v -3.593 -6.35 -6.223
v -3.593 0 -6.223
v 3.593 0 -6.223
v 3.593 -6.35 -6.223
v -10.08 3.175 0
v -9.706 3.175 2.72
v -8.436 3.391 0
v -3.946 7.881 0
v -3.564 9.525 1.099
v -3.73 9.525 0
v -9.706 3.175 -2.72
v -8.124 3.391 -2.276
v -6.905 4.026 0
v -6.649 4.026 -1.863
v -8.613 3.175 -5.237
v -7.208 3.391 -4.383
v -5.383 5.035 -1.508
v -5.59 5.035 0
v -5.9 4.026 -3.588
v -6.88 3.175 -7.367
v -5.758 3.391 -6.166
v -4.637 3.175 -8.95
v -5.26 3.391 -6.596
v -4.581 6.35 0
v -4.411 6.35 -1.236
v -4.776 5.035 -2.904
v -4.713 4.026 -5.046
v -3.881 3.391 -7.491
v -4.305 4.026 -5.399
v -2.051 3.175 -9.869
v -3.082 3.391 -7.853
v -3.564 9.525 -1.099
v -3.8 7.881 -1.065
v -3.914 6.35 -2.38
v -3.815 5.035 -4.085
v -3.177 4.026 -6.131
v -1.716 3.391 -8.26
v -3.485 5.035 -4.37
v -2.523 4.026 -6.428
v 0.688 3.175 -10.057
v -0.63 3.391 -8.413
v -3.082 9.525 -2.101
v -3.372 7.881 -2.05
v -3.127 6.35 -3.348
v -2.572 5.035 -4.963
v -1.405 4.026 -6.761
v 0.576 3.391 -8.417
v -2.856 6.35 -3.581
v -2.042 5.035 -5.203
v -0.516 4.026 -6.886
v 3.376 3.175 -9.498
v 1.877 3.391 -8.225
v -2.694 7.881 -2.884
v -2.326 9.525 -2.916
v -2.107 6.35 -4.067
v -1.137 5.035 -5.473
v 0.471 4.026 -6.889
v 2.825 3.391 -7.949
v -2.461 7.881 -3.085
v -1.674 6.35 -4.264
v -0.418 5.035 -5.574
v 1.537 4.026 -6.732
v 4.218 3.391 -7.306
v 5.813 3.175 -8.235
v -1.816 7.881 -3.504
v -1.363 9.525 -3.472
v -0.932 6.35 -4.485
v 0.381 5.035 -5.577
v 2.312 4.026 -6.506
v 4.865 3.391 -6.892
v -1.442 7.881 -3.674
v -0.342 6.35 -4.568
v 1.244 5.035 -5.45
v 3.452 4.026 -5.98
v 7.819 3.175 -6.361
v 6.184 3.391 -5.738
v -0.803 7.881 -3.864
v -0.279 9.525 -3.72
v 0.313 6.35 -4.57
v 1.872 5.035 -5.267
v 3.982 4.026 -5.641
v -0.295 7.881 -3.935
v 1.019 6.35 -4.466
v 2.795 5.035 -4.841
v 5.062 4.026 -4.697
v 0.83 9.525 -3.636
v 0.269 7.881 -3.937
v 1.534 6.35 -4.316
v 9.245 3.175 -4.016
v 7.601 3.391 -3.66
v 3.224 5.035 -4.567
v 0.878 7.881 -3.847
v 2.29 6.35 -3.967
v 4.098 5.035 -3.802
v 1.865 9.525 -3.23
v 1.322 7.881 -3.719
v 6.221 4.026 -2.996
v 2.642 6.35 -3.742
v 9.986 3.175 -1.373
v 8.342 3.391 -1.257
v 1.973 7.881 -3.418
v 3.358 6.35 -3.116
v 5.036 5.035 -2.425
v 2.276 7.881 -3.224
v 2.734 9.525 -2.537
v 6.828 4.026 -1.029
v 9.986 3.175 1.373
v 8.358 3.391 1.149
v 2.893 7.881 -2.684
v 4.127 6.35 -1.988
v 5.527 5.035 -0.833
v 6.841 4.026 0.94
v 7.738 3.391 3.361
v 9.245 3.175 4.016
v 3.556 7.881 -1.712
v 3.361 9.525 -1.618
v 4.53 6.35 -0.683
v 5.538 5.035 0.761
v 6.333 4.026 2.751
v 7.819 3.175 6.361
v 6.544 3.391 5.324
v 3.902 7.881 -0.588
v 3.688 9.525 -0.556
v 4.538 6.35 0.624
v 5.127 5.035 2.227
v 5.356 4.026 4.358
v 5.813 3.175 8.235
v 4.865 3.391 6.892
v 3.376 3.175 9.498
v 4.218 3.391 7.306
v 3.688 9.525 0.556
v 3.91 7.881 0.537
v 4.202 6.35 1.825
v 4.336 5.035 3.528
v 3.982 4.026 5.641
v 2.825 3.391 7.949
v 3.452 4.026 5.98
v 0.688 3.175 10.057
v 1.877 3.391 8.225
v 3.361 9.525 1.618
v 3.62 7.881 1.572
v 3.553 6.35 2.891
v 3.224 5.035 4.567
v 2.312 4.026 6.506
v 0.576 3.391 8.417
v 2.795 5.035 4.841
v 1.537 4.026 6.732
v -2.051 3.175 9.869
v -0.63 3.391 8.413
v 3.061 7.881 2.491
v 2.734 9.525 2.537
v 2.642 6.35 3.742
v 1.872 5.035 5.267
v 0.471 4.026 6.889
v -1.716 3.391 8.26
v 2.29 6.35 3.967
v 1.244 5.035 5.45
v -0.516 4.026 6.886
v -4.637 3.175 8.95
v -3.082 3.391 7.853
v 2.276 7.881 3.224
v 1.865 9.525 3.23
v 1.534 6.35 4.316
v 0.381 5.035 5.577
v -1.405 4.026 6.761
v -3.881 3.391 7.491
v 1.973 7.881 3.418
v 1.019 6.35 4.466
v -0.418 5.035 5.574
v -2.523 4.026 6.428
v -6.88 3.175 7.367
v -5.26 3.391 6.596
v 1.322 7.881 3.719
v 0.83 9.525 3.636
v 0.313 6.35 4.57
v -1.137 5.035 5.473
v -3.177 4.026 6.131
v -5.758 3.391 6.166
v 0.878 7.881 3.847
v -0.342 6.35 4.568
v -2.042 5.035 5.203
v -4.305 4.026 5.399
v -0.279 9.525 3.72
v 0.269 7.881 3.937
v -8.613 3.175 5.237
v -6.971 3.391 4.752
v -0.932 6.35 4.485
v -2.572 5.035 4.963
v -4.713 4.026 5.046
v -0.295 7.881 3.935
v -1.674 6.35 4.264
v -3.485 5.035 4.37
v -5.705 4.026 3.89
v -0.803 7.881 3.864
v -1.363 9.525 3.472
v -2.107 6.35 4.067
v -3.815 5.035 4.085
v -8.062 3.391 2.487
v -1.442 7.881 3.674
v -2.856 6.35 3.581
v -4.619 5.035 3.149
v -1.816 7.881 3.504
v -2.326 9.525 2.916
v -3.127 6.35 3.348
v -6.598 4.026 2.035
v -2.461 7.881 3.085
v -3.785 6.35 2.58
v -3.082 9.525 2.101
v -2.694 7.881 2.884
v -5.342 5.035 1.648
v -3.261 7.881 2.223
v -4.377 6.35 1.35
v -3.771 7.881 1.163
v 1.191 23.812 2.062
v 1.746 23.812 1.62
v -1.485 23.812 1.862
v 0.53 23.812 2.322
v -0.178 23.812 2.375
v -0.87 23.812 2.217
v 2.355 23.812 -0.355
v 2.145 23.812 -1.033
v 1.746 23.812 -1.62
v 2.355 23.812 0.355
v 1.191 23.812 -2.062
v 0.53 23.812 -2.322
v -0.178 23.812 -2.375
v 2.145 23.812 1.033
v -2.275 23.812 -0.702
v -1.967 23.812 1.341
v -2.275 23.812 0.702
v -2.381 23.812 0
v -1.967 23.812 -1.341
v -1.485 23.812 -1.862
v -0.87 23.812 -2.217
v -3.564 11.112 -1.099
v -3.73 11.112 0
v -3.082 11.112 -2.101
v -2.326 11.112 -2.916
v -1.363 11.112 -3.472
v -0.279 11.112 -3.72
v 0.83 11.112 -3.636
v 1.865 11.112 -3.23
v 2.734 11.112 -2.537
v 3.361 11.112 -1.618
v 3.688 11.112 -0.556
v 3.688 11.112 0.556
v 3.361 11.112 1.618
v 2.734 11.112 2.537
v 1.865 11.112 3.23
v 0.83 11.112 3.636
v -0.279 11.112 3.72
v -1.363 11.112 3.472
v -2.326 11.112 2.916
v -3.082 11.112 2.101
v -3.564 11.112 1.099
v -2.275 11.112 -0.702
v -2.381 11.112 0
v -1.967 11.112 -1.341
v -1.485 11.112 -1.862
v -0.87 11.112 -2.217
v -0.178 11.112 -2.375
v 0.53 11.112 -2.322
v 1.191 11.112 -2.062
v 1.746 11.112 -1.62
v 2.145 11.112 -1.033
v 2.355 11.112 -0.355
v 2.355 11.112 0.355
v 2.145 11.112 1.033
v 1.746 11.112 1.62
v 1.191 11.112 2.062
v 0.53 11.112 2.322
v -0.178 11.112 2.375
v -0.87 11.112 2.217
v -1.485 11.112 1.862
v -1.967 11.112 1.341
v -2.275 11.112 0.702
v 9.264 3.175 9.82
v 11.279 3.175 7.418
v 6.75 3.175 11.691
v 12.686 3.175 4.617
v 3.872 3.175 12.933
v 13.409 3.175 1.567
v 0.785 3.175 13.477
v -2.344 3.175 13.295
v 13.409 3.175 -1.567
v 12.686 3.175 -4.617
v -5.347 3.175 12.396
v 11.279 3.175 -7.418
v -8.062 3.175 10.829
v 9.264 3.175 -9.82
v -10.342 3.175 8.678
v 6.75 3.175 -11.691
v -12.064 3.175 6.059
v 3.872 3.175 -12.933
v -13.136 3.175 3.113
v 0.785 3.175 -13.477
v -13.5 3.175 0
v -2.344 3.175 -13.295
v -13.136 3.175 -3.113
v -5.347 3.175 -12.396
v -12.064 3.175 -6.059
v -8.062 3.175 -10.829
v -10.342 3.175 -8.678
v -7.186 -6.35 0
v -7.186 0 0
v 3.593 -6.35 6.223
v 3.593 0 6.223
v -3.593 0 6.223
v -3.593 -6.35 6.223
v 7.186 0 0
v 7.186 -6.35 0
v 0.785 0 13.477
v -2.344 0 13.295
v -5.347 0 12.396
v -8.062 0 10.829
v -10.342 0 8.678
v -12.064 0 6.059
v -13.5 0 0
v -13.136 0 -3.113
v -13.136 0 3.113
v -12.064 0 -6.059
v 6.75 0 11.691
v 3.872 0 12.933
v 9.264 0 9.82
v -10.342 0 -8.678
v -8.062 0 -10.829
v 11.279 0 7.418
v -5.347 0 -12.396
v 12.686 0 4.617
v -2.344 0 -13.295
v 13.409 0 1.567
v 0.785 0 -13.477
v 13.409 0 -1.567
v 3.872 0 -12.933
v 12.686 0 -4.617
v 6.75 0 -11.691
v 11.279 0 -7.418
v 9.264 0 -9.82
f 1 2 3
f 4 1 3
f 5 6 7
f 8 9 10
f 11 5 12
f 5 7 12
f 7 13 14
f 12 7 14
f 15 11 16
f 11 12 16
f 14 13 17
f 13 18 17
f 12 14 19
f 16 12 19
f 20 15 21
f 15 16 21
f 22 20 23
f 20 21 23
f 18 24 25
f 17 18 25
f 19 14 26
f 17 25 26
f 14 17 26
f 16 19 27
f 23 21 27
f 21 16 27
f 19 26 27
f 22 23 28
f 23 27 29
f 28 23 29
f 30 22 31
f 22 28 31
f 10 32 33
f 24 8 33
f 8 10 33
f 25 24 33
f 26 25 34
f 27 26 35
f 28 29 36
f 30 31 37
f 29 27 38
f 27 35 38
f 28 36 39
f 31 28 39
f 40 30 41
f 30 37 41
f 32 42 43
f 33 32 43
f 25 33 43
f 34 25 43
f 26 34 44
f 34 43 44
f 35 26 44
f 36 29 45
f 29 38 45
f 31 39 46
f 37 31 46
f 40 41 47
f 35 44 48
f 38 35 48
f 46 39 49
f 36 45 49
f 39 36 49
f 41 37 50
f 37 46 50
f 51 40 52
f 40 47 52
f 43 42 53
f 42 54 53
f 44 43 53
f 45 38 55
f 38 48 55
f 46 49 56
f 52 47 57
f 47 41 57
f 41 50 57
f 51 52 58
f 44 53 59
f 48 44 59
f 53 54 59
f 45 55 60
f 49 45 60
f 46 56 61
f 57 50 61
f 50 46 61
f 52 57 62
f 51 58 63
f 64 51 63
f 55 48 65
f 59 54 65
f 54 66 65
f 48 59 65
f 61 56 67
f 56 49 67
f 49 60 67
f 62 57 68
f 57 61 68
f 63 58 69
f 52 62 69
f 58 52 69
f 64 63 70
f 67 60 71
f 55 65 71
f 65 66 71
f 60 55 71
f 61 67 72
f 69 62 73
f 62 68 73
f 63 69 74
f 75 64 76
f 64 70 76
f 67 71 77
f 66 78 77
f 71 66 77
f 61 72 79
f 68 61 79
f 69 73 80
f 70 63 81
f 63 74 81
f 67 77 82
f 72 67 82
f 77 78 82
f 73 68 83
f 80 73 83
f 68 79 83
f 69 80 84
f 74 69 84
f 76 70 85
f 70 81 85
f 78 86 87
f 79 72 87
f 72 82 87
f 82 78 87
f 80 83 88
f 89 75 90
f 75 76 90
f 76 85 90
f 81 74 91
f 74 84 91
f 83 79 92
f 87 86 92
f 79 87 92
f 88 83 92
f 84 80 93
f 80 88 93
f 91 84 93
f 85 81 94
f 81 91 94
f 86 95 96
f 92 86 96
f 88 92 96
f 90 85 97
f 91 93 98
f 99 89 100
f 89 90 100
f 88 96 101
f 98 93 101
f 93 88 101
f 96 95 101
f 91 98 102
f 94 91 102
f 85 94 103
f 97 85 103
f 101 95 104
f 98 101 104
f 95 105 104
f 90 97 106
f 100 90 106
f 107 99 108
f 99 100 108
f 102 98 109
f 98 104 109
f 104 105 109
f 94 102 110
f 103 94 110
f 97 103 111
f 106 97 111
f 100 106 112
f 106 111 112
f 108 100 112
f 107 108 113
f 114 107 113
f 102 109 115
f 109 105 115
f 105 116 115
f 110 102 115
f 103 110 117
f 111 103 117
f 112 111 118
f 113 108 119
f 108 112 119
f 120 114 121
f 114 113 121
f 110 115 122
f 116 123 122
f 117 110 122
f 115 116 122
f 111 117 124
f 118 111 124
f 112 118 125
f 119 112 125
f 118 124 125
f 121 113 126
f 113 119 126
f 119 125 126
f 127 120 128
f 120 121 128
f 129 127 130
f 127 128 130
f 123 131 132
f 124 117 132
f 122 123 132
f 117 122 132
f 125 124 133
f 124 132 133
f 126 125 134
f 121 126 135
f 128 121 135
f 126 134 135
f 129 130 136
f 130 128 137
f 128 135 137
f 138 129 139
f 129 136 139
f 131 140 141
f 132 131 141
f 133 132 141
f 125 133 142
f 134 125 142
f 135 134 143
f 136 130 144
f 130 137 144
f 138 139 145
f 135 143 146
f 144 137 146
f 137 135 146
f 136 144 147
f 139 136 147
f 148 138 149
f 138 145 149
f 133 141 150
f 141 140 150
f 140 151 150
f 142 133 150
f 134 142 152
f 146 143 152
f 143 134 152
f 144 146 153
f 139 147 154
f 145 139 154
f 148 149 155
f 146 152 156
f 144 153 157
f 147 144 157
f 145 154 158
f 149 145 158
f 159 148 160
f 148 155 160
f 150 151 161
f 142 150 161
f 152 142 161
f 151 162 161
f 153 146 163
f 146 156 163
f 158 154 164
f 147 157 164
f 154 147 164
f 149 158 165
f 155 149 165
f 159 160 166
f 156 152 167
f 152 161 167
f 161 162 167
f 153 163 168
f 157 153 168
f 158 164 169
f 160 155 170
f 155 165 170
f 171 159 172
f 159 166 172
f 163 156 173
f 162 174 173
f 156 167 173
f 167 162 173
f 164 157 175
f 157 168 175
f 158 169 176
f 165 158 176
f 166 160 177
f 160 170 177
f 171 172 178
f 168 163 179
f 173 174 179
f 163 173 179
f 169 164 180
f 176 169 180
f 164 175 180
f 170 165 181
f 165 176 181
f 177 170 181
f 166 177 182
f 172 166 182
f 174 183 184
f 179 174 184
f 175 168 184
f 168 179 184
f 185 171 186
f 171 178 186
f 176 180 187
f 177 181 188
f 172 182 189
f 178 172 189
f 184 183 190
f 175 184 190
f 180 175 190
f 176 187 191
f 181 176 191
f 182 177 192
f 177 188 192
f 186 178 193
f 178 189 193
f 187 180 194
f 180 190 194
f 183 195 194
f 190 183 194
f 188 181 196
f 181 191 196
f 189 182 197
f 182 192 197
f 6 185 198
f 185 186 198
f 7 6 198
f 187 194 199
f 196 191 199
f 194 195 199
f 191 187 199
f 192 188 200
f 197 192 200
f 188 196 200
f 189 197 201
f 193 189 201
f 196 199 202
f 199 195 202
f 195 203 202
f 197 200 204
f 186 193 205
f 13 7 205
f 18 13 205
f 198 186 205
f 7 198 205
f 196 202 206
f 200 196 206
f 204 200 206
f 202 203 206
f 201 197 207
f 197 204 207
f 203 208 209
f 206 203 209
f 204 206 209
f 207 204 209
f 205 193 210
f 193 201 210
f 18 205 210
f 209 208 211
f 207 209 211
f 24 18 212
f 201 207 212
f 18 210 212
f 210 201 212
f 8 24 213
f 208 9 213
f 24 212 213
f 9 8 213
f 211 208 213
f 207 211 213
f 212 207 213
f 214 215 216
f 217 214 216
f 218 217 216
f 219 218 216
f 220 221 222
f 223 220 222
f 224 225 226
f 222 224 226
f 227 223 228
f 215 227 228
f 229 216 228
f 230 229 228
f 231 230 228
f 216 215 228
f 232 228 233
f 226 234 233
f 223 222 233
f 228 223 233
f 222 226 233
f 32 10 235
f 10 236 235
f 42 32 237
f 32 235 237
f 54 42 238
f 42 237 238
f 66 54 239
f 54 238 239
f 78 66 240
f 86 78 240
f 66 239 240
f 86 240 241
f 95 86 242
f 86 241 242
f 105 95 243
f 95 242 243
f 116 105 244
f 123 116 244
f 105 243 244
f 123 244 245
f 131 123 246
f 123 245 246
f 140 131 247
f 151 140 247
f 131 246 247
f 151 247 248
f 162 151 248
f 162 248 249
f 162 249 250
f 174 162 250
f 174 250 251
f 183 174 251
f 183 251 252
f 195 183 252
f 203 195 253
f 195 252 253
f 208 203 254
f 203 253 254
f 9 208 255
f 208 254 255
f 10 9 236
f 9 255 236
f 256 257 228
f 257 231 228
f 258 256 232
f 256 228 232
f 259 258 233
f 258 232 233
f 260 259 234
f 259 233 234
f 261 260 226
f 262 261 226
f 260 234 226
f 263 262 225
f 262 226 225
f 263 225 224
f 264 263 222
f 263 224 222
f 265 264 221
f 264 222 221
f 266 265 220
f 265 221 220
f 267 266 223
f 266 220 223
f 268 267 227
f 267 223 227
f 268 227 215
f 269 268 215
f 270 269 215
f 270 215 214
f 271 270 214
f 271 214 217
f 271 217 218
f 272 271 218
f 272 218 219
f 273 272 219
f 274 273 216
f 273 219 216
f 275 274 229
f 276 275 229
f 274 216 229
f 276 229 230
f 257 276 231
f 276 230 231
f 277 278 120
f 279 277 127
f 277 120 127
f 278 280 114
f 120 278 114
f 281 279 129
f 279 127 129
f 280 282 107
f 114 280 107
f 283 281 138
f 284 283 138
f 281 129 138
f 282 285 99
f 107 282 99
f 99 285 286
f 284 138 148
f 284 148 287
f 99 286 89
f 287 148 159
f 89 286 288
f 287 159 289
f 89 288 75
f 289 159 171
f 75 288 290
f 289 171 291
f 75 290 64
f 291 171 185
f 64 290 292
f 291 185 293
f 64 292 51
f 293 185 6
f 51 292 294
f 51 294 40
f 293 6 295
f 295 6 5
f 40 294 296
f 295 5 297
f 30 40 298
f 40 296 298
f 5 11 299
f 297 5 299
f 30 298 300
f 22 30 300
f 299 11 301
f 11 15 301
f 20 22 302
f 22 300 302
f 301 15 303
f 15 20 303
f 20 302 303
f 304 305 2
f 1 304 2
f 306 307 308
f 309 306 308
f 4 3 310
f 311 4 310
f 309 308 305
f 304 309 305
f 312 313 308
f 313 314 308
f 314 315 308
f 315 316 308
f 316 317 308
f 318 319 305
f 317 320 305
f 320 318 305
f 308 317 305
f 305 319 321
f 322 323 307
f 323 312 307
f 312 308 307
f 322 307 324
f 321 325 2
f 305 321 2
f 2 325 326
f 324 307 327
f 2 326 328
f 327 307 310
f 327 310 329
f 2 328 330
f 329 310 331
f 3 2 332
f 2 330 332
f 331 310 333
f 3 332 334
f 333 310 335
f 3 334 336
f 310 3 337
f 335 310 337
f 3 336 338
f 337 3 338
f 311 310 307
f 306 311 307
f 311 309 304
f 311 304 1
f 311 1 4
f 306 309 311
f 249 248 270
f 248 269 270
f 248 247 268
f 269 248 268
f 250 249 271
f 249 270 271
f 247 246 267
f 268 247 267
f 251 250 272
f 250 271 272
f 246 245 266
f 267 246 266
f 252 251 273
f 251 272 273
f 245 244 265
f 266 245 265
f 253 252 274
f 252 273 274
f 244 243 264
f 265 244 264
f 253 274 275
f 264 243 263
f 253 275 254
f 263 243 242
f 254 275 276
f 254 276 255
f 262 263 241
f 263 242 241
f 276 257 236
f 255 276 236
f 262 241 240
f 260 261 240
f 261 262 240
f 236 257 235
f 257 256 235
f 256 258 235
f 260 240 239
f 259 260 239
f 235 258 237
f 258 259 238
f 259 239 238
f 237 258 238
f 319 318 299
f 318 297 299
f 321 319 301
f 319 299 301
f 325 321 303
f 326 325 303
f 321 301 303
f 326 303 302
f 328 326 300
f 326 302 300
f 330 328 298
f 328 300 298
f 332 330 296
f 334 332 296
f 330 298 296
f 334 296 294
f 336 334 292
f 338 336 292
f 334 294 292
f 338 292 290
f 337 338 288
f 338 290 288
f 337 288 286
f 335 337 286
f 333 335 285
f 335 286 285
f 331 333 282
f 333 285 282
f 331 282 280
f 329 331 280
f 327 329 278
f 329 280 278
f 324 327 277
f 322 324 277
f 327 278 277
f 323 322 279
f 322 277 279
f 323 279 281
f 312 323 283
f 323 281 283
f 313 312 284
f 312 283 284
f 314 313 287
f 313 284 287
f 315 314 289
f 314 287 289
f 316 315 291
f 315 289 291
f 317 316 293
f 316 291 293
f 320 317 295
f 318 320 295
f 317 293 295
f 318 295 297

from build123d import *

# Parameters (mm, degrees)
BOSS_EXTRUDE1_DEPTH = 6.35


with BuildPart() as part:
    # Sketch1 → Revolve1 (revolve)
    with BuildSketch(Plane.XY, mode=Mode.PRIVATE) as revolve1_sk:
        with BuildLine():
            Line((0, 0), (13.5, 0))
            Line((13.5, 0), (13.5, 3.175))
            Line((13.5, 3.175), (10.08, 3.175))
            ThreePointArc((10.08, 3.175), (5.589871939, 5.034871939), (3.73, 9.525))
            Line((3.73, 9.525), (3.73, 11.1125))
            Line((3.73, 11.1125), (2.38125, 11.1125))
            Line((2.38125, 11.1125), (2.38125, 23.8125))
            Line((2.38125, 23.8125), (0, 23.8125))
            Line((0, 23.8125), (0, 0))
        make_face()
    revolve(revolve1_sk.sketch.rotate(Axis((0, 23.8125, 0), (0, -1, 0)), 180), axis=Axis((0, 23.8125, 0), (0, -1, 0)))

    # Sketch2 → Boss-Extrude1 (add)
    with BuildSketch(Plane.XZ):
        Polygon((7.18570145, 0), (3.592850725, 6.223), (-3.592850725, 6.223), (-7.18570145, 0), (-3.592850725, -6.223), (3.592850725, -6.223), align=None)
    extrude(amount=BOSS_EXTRUDE1_DEPTH)


solid = part.part
